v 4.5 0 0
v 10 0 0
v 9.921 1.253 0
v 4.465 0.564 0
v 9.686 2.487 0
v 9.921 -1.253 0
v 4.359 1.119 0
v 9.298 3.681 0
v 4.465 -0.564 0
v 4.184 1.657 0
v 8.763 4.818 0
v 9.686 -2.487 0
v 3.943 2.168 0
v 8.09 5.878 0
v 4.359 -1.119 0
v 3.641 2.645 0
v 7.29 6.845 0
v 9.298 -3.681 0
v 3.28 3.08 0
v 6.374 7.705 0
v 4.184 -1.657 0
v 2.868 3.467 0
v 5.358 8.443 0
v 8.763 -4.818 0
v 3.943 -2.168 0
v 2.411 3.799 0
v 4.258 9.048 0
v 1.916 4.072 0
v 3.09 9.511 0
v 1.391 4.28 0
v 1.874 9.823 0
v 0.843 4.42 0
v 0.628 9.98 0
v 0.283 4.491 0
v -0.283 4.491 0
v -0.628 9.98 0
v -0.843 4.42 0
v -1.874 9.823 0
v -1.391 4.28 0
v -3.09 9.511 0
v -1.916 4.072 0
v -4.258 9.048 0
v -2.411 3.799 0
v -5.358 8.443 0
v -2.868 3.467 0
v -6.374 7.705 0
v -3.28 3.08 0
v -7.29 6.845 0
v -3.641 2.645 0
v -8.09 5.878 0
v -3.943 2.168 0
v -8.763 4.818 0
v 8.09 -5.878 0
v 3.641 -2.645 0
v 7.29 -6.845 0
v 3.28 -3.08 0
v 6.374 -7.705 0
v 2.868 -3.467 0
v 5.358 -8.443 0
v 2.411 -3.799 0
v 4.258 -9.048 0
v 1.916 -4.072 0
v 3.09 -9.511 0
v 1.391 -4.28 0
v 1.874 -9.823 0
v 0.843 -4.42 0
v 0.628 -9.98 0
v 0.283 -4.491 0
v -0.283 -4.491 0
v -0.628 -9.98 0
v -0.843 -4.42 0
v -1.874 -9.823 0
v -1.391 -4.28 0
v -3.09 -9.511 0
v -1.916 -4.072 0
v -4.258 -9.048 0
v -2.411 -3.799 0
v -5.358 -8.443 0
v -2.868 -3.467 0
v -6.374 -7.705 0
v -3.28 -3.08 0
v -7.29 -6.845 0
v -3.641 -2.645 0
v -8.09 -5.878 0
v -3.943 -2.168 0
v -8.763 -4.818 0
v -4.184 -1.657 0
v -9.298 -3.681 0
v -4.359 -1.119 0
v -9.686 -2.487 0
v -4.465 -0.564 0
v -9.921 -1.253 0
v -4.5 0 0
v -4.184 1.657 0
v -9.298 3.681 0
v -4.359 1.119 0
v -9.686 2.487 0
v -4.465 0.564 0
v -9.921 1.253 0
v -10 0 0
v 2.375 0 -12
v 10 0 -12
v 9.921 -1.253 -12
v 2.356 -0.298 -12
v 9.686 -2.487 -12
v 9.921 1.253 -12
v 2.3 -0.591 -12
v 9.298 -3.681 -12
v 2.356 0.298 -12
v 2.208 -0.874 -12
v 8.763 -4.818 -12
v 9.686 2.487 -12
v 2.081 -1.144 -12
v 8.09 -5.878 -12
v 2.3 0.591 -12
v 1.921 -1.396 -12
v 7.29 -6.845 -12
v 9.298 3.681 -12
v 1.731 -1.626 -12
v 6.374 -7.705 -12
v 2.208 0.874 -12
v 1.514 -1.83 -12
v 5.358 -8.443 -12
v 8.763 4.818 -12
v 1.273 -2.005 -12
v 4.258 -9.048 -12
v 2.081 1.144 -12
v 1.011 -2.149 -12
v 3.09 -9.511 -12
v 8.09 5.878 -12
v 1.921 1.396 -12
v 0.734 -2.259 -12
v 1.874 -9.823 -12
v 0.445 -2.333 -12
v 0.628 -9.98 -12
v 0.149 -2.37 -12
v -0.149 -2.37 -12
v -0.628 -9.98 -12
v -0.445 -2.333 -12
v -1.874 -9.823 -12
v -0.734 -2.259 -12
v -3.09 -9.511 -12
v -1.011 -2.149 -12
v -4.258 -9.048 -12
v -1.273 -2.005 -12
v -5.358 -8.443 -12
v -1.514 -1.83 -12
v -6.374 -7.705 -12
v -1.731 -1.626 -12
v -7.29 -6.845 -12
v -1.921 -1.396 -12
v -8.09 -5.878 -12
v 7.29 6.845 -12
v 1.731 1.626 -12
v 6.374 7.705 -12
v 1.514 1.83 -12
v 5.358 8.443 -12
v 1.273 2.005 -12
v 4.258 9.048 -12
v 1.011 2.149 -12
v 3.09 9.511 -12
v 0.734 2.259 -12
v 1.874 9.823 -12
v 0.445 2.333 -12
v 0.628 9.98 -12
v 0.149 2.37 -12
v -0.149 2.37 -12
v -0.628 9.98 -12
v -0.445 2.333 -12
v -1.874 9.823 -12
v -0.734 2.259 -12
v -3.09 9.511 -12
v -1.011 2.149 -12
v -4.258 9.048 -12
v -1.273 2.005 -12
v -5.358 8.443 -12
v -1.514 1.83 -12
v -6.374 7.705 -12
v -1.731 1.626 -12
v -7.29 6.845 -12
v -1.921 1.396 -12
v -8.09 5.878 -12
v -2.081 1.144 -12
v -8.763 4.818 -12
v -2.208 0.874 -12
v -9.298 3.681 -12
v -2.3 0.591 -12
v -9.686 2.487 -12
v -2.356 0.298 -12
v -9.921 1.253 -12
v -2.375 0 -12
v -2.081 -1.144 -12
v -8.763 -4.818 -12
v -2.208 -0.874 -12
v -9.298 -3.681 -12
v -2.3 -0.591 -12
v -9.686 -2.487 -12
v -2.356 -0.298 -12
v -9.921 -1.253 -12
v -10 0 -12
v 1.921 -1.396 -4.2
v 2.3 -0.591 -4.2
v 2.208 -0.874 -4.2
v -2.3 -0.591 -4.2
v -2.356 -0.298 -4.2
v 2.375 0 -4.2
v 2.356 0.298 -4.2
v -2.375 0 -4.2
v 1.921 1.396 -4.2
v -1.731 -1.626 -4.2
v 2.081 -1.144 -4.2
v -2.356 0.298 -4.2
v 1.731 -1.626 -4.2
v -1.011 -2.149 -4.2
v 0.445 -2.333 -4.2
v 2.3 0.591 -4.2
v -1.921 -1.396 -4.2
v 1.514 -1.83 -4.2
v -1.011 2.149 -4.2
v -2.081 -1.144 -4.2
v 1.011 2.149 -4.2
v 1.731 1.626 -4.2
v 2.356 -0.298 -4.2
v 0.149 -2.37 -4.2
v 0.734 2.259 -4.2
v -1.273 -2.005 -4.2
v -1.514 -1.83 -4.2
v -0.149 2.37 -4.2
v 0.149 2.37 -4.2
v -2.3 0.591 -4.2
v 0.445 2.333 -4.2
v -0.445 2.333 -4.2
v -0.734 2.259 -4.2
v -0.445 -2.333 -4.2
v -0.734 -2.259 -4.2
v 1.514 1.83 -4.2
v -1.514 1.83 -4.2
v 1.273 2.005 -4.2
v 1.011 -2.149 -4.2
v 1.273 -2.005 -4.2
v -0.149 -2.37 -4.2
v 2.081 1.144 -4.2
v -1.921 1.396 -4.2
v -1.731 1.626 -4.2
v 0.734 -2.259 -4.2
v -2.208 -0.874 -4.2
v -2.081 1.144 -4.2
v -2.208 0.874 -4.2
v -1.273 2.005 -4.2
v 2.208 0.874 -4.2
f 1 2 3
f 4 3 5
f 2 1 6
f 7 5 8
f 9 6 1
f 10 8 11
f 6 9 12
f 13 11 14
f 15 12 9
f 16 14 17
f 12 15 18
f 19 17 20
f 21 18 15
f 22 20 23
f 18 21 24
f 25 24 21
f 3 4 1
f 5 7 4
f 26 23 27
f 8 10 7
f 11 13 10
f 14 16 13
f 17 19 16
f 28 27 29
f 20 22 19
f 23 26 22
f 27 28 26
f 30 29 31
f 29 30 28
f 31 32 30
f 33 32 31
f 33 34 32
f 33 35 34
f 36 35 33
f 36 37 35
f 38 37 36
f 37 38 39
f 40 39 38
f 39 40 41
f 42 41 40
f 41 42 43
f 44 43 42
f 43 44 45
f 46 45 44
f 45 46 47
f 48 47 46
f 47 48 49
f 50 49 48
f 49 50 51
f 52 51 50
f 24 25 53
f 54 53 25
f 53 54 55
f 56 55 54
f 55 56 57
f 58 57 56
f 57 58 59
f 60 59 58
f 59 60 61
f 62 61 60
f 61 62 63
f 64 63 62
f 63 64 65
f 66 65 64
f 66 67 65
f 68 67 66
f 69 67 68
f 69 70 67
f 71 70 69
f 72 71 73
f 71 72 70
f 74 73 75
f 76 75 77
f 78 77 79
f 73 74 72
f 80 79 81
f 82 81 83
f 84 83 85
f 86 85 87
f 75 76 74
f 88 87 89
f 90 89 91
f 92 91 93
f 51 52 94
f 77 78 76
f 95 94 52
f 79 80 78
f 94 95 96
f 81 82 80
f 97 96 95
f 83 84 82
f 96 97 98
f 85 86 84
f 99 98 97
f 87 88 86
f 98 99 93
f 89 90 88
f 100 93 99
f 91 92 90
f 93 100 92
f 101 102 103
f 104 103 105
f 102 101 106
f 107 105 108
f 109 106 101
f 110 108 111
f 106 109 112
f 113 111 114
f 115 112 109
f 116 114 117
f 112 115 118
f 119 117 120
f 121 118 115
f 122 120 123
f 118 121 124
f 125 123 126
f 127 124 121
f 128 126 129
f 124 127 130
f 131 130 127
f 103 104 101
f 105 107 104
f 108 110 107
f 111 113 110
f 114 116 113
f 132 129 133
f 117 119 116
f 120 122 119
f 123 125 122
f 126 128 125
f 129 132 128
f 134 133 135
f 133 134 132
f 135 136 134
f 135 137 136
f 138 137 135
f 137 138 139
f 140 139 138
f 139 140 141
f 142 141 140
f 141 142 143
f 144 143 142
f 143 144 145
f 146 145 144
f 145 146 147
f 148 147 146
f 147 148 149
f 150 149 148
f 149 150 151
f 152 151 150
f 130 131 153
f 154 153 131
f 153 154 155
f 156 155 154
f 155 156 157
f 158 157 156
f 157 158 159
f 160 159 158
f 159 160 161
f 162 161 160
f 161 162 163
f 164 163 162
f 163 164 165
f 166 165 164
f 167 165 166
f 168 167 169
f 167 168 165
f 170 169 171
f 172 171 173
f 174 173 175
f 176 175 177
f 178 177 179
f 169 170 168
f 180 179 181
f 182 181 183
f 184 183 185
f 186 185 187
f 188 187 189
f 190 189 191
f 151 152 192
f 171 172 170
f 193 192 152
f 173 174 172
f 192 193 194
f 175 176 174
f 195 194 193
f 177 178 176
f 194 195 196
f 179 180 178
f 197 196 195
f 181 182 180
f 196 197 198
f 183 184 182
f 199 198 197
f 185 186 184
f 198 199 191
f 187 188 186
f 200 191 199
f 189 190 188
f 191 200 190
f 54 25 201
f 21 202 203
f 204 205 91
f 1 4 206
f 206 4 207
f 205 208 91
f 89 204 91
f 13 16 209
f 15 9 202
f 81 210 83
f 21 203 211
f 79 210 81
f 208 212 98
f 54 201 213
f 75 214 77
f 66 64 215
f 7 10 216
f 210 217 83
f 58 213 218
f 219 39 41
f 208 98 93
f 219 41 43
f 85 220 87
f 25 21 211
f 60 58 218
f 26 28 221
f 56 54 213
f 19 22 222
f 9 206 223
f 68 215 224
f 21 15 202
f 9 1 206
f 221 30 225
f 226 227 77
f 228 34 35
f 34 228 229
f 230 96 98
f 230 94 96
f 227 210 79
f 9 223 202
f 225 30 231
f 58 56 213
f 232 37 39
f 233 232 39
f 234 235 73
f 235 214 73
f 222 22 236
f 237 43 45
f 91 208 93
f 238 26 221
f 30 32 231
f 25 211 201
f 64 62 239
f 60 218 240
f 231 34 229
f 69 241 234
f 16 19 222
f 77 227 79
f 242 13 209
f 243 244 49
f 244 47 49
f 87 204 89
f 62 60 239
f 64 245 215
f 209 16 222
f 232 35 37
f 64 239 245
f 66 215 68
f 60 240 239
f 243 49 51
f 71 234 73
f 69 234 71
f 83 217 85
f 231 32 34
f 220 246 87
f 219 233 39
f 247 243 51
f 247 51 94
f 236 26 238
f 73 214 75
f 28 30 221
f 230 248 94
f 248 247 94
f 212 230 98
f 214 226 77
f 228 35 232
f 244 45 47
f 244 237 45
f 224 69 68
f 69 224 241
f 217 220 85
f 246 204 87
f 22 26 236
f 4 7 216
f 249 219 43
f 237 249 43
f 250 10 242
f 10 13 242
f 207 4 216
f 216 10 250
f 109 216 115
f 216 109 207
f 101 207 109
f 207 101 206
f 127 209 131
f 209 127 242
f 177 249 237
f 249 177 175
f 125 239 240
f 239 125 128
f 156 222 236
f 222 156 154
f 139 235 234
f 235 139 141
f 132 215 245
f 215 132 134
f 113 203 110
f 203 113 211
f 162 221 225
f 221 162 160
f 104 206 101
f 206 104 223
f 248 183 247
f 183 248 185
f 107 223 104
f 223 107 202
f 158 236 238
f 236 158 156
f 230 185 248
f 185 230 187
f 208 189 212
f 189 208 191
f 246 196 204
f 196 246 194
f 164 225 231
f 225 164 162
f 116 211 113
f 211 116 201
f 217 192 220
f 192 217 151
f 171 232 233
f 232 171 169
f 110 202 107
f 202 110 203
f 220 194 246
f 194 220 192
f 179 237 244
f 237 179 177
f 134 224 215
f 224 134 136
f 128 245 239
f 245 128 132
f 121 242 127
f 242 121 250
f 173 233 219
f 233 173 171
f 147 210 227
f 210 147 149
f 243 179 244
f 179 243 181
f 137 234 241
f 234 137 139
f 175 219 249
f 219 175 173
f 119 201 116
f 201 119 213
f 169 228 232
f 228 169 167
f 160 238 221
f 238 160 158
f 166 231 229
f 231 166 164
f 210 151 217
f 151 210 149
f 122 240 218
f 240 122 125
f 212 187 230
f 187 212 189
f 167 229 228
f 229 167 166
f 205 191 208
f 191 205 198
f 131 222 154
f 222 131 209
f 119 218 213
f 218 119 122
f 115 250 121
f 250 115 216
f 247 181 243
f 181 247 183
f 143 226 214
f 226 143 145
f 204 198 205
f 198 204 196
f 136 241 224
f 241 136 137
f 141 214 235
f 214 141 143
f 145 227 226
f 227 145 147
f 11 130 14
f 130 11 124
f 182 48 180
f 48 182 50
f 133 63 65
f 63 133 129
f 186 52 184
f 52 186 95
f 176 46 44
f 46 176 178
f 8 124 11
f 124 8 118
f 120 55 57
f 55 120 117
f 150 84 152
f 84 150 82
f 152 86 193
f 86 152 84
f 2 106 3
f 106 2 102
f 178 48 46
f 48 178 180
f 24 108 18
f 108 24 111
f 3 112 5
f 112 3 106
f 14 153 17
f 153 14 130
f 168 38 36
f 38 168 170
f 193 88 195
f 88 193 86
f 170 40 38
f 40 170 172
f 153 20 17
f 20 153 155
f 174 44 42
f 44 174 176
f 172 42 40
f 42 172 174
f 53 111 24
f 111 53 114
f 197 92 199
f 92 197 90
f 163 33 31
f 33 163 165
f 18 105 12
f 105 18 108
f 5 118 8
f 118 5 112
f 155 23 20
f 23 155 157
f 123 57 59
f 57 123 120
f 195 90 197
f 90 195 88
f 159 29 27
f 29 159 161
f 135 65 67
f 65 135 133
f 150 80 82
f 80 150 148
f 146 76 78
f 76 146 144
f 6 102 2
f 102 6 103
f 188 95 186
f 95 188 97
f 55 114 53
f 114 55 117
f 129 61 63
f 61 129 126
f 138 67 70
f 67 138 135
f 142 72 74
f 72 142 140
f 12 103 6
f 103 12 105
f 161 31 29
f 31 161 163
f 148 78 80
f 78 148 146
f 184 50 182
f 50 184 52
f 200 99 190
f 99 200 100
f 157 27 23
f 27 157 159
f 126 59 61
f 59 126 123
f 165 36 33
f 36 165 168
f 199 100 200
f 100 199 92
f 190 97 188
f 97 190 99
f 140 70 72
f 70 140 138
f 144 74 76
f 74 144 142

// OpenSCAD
$fn = 50;


difference() {
	union() {
		translate(v = [0, 0, -12.0000000000]) {
			cylinder(h = 12, r = 10.0000000000);
		}
		cylinder(h = 0, r = 16.0000000000);
	}
	union() {
		translate(v = [0, 0, 0]) {
			rotate(a = [0, 0, 0]) {
				difference() {
					union() {
						#translate(v = [0, 0, -12.0000000000]) {
							cylinder(h = 12, r = 2.2500000000);
						}
						#translate(v = [0, 0, -4.2000000000]) {
							cylinder(h = 4.2000000000, r = 10.0000000000, r1 = 2.3750000000, r2 = 4.5000000000);
						}
						#translate(v = [0, 0, -12.0000000000]) {
							cylinder(h = 12, r = 2.3750000000);
						}
						#translate(v = [0, 0, -12.0000000000]) {
							cylinder(h = 12, r = 2.2500000000);
						}
					}
					union();
				}
			}
		}
	}
}
